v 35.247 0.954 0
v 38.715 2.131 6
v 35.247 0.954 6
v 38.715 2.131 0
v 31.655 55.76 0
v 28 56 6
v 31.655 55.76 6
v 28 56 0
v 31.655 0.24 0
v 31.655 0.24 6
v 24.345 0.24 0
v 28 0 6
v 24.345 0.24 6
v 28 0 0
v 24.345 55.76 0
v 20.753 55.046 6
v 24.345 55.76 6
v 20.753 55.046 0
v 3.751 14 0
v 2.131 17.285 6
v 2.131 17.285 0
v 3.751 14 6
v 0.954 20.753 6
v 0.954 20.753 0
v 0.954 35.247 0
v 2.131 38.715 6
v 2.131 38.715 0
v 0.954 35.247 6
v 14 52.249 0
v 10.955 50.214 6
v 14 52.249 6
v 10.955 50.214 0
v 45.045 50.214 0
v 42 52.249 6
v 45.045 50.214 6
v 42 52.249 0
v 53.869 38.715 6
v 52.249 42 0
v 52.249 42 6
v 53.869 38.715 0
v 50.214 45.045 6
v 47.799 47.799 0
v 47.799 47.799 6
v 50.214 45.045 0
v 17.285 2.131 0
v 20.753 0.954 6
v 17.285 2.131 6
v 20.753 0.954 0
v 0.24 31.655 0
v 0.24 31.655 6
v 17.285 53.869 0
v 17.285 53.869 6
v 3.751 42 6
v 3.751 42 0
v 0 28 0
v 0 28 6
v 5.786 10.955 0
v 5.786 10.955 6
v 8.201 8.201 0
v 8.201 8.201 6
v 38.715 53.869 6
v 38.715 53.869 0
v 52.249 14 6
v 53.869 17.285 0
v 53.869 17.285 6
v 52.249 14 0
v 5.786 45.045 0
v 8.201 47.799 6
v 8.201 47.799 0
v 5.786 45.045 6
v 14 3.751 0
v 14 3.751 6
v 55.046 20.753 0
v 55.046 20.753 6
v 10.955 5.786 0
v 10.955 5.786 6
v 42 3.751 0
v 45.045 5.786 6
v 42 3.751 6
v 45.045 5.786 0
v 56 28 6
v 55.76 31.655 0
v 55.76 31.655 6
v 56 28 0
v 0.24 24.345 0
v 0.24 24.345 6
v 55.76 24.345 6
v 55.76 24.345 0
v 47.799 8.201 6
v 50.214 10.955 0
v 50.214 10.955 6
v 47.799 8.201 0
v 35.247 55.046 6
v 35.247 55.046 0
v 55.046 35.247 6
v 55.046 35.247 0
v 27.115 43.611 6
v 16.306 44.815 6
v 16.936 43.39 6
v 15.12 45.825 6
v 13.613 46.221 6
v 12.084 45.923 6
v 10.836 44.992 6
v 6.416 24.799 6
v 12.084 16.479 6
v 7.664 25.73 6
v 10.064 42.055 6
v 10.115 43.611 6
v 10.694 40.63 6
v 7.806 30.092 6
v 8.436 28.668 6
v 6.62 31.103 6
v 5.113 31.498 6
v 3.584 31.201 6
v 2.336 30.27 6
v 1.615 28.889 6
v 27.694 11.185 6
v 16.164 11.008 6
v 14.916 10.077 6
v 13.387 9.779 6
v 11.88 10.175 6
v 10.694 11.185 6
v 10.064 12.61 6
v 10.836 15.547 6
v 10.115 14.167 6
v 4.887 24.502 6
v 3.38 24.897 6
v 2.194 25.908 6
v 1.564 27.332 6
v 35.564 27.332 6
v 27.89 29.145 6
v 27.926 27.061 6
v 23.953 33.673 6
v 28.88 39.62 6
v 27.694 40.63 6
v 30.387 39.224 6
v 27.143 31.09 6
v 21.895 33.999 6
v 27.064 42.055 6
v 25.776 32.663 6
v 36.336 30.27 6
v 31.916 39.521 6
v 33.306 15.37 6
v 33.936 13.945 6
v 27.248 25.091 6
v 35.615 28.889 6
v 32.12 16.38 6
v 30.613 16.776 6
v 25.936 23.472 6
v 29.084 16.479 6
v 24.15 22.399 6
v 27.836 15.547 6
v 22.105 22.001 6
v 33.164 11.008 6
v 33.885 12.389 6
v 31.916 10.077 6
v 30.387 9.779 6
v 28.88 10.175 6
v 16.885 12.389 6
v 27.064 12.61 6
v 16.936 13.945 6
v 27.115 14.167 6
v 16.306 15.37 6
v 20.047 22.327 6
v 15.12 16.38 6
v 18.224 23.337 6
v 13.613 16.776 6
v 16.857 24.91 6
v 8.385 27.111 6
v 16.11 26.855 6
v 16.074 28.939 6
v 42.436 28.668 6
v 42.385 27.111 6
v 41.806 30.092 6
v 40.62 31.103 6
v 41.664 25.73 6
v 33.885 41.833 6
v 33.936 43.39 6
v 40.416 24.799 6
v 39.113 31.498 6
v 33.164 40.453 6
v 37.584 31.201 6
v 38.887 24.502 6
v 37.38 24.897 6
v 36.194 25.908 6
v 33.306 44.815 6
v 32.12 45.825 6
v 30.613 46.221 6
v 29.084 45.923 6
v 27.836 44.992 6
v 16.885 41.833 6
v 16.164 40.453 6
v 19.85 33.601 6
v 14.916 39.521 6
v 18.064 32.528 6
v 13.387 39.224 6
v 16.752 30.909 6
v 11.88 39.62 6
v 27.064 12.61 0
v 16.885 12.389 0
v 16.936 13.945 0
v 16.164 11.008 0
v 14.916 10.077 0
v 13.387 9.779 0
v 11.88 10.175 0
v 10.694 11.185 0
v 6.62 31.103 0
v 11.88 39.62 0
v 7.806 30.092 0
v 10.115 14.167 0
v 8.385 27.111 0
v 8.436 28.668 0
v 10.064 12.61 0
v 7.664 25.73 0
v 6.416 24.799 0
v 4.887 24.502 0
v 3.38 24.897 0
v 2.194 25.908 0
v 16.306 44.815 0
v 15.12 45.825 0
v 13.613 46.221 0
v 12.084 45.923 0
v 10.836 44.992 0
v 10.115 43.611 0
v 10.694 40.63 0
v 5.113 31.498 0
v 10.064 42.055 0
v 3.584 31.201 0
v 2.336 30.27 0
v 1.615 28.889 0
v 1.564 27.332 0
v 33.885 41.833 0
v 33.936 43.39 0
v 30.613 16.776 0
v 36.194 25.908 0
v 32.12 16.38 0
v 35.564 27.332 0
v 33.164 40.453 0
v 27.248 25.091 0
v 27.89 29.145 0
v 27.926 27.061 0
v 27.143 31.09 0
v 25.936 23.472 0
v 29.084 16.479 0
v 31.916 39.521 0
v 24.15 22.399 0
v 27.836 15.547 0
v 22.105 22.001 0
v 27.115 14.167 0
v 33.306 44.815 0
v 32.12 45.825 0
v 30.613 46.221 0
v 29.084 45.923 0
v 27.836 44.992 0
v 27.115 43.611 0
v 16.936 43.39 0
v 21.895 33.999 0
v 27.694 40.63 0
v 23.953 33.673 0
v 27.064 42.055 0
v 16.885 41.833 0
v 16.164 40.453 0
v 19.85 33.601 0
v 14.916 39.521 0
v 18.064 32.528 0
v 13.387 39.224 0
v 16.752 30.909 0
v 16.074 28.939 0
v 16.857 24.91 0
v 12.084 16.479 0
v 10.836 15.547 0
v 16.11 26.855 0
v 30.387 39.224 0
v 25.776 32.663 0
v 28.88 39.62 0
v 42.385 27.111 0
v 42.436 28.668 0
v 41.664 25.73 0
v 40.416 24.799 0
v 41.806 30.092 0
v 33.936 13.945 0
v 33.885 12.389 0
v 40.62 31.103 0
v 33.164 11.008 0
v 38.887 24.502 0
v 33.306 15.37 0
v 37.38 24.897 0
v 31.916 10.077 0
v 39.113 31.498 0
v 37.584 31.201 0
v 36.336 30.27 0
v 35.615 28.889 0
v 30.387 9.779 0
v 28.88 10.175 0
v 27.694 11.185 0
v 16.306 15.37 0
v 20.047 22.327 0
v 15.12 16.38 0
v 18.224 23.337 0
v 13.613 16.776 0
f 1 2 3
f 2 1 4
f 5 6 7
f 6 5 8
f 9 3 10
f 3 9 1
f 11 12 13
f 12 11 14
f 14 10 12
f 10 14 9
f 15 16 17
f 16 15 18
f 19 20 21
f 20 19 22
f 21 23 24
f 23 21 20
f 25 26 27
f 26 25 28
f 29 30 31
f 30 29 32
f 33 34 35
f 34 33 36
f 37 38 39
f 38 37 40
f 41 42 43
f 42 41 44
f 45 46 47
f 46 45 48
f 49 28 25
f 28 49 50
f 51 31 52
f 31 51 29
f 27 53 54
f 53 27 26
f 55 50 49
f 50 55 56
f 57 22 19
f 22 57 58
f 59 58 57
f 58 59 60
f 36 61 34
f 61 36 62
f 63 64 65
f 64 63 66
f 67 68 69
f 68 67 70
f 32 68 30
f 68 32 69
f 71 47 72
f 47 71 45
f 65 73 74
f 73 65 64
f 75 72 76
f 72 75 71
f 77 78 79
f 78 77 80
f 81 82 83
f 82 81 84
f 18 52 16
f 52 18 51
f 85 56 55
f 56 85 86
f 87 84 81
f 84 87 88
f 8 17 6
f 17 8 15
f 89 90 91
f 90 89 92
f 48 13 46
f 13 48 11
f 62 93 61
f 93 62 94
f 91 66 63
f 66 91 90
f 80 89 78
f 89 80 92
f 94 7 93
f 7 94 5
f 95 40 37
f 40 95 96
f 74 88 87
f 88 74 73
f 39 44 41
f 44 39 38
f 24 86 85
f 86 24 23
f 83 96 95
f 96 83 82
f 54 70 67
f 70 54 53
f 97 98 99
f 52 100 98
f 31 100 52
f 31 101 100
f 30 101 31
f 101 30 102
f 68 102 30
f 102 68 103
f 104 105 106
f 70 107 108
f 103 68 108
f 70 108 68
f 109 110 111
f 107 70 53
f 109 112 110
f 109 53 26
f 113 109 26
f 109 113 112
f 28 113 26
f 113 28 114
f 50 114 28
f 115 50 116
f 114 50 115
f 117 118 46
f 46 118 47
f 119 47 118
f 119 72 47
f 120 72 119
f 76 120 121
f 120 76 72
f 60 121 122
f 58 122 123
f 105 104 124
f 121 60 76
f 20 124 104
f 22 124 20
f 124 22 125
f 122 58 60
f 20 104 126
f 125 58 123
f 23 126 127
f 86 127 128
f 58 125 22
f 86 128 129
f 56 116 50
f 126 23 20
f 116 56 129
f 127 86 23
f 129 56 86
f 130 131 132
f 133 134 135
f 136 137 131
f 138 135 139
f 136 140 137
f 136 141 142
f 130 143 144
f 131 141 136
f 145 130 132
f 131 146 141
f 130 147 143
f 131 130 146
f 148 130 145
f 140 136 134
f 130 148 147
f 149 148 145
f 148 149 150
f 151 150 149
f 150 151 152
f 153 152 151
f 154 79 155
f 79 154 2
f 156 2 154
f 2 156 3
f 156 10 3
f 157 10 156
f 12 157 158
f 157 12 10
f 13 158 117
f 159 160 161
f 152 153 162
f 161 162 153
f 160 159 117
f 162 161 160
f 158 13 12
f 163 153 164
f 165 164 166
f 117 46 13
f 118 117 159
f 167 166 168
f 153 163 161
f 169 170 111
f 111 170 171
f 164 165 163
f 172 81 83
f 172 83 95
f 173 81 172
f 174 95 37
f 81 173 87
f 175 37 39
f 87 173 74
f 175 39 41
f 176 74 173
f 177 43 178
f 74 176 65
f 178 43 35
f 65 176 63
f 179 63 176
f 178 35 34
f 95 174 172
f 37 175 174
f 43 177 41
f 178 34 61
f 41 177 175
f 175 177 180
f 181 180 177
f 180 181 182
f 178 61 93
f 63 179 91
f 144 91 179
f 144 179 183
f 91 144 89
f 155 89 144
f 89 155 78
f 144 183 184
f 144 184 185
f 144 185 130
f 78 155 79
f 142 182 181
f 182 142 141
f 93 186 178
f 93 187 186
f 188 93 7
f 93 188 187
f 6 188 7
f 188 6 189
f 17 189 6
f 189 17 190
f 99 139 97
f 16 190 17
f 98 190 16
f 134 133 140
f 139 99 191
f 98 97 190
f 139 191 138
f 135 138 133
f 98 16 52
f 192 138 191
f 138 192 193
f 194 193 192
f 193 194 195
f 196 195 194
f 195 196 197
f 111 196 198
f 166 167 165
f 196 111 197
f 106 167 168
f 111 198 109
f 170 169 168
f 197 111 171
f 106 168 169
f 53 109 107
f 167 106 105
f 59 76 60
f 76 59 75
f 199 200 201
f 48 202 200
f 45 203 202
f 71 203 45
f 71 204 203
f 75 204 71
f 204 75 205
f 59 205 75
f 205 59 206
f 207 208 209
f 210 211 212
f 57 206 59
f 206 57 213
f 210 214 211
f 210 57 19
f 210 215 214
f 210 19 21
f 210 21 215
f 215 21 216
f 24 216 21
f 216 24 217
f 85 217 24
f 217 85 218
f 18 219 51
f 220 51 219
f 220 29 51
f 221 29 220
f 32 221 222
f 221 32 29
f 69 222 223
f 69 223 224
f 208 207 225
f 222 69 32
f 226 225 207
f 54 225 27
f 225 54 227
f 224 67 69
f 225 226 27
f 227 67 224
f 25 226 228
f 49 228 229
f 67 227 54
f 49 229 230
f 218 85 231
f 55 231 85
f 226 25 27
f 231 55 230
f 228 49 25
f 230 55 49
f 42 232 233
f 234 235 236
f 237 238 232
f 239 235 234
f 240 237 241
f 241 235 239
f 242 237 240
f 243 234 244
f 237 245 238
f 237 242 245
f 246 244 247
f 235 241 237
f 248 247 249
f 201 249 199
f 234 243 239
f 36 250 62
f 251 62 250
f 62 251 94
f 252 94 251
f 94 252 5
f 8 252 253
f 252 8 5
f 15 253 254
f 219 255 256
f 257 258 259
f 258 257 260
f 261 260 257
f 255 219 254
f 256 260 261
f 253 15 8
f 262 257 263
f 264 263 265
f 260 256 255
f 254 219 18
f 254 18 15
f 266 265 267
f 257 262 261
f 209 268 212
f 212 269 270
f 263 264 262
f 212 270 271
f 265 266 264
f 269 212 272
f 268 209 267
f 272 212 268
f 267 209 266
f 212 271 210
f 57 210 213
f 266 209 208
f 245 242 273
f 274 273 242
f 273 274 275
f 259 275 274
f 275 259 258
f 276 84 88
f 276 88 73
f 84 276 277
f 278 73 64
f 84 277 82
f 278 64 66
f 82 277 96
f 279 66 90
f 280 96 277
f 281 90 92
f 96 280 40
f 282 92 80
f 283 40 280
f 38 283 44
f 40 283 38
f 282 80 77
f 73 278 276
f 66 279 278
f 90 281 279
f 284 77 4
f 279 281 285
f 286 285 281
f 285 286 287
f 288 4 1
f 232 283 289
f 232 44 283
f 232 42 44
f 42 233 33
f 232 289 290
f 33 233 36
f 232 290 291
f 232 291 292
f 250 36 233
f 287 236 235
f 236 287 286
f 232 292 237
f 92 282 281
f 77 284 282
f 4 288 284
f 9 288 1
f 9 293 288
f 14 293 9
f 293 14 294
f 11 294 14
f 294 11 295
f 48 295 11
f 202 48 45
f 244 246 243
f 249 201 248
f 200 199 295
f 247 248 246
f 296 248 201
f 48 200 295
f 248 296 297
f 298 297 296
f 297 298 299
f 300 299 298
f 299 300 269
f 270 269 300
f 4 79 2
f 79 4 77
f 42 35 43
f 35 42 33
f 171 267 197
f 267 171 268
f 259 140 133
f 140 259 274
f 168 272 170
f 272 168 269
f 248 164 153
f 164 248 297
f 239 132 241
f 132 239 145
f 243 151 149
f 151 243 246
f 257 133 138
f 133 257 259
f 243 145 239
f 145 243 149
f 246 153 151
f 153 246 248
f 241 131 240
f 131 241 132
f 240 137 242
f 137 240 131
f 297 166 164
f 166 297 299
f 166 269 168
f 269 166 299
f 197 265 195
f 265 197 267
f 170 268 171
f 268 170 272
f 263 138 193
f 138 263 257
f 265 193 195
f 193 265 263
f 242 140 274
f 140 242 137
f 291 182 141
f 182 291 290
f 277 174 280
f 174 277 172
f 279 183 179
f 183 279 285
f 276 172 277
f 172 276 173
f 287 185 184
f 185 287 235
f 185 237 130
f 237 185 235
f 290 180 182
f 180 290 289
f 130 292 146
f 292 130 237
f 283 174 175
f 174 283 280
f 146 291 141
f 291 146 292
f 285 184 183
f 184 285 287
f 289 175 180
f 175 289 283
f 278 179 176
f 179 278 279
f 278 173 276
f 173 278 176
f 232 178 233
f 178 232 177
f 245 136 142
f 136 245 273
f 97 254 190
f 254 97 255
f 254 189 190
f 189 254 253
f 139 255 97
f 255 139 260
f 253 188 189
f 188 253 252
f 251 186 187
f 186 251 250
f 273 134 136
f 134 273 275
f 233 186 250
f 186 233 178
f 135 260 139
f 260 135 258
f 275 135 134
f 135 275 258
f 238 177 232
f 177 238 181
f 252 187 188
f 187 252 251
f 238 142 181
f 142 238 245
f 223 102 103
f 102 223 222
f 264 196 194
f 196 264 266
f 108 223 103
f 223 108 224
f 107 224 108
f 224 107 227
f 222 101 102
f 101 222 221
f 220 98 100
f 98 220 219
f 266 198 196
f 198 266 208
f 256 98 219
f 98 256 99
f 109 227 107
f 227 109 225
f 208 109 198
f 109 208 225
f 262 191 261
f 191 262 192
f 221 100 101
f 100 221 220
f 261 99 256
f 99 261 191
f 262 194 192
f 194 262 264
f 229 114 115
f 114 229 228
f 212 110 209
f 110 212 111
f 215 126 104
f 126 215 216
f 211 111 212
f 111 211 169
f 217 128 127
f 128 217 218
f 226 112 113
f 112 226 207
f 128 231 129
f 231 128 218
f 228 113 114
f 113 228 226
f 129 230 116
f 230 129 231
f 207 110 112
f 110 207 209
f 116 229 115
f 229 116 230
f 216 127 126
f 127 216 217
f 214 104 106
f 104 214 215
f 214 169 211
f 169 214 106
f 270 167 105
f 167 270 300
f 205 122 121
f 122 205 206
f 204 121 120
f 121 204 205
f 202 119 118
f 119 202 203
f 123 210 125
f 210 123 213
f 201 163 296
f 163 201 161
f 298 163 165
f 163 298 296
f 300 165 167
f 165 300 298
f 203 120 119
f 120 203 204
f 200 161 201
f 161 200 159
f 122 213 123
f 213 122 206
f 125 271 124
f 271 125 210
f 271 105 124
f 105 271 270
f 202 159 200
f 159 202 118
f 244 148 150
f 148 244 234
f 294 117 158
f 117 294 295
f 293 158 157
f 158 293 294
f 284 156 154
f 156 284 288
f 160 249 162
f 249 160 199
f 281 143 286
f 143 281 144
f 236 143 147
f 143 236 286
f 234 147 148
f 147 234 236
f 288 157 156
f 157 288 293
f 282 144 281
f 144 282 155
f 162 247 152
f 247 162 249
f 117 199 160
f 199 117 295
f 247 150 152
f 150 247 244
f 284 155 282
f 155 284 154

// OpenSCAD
$fn = 32;

// ----------------------------------------------------------------------
// Cam plate: eccentric cam, base R28
// ----------------------------------------------------------------------

// --- parameters (mm) ---
base_r = 28;              // base circle radius
lobe_h = 8;               // cam lobe rise
bore_r = 6;               // shaft bore radius
plate_t = 6;              // plate thickness, Z (extrusion height)
ecc = 6;                  // disc eccentricity
ring_r = 17;              // lightening ring radius
bolt_r = 3.5;             // lightening hole radius

profile = [[56, 28], [55.76, 31.655], [55.046, 35.247], [53.869, 38.715], [52.249, 42], [50.214, 45.045], [47.799, 47.799], [45.045, 50.214], [42, 52.249], [38.715, 53.869], [35.247, 55.046], [31.655, 55.76], [28, 56], [24.345, 55.76], [20.753, 55.046], [17.285, 53.869], [14, 52.249], [10.955, 50.214], [8.201, 47.799], [5.786, 45.045], [3.751, 42], [2.131, 38.715], [0.954, 35.247], [0.24, 31.655], [0, 28], [0.24, 24.345], [0.954, 20.753], [2.131, 17.285], [3.751, 14], [5.786, 10.955], [8.201, 8.201], [10.955, 5.786], [14, 3.751], [17.285, 2.131], [20.753, 0.954], [24.345, 0.24], [28, 0], [31.655, 0.24], [35.247, 0.954], [38.715, 2.131], [42, 3.751], [45.045, 5.786], [47.799, 8.201], [50.214, 10.955], [52.249, 14], [53.869, 17.285], [55.046, 20.753], [55.76, 24.345]];  // primary outline, 48 points, counter clockwise
void_1 = [[27.89, 29.145], [27.143, 31.09], [25.776, 32.663], [23.953, 33.673], [21.895, 33.999], [19.85, 33.601], [18.064, 32.528], [16.752, 30.909], [16.074, 28.939], [16.11, 26.855], [16.857, 24.91], [18.224, 23.337], [20.047, 22.327], [22.105, 22.001], [24.15, 22.399], [25.936, 23.472], [27.248, 25.091], [27.926, 27.061]];  // shaft bore, 18 points
void_2 = [[42.436, 28.668], [41.806, 30.092], [40.62, 31.103], [39.113, 31.498], [37.584, 31.201], [36.336, 30.27], [35.615, 28.889], [35.564, 27.332], [36.194, 25.908], [37.38, 24.897], [38.887, 24.502], [40.416, 24.799], [41.664, 25.73], [42.385, 27.111]];  // lightening hole 1, 14 points
void_3 = [[33.936, 43.39], [33.306, 44.815], [32.12, 45.825], [30.613, 46.221], [29.084, 45.923], [27.836, 44.992], [27.115, 43.611], [27.064, 42.055], [27.694, 40.63], [28.88, 39.62], [30.387, 39.224], [31.916, 39.521], [33.164, 40.453], [33.885, 41.833]];  // lightening hole 2, 14 points
void_4 = [[16.936, 43.39], [16.306, 44.815], [15.12, 45.825], [13.613, 46.221], [12.084, 45.923], [10.836, 44.992], [10.115, 43.611], [10.064, 42.055], [10.694, 40.63], [11.88, 39.62], [13.387, 39.224], [14.916, 39.521], [16.164, 40.453], [16.885, 41.833]];  // lightening hole 3, 14 points
void_5 = [[8.436, 28.668], [7.806, 30.092], [6.62, 31.103], [5.113, 31.498], [3.584, 31.201], [2.336, 30.27], [1.615, 28.889], [1.564, 27.332], [2.194, 25.908], [3.38, 24.897], [4.887, 24.502], [6.416, 24.799], [7.664, 25.73], [8.385, 27.111]];  // lightening hole 4, 14 points
void_6 = [[16.936, 13.945], [16.306, 15.37], [15.12, 16.38], [13.613, 16.776], [12.084, 16.479], [10.836, 15.547], [10.115, 14.167], [10.064, 12.61], [10.694, 11.185], [11.88, 10.175], [13.387, 9.779], [14.916, 10.077], [16.164, 11.008], [16.885, 12.389]];  // lightening hole 5, 14 points
void_7 = [[33.936, 13.945], [33.306, 15.37], [32.12, 16.38], [30.613, 16.776], [29.084, 16.479], [27.836, 15.547], [27.115, 14.167], [27.064, 12.61], [27.694, 11.185], [28.88, 10.175], [30.387, 9.779], [31.916, 10.077], [33.164, 11.008], [33.885, 12.389]];  // lightening hole 6, 14 points

// --- the one profile operation ---
difference() {
  linear_extrude(height = plate_t) polygon(points = profile);
  translate([0, 0, -1])
    linear_extrude(height = plate_t + 2) polygon(points = void_1);
  translate([0, 0, -1])
    linear_extrude(height = plate_t + 2) polygon(points = void_2);
  translate([0, 0, -1])
    linear_extrude(height = plate_t + 2) polygon(points = void_3);
  translate([0, 0, -1])
    linear_extrude(height = plate_t + 2) polygon(points = void_4);
  translate([0, 0, -1])
    linear_extrude(height = plate_t + 2) polygon(points = void_5);
  translate([0, 0, -1])
    linear_extrude(height = plate_t + 2) polygon(points = void_6);
  translate([0, 0, -1])
    linear_extrude(height = plate_t + 2) polygon(points = void_7);
}
